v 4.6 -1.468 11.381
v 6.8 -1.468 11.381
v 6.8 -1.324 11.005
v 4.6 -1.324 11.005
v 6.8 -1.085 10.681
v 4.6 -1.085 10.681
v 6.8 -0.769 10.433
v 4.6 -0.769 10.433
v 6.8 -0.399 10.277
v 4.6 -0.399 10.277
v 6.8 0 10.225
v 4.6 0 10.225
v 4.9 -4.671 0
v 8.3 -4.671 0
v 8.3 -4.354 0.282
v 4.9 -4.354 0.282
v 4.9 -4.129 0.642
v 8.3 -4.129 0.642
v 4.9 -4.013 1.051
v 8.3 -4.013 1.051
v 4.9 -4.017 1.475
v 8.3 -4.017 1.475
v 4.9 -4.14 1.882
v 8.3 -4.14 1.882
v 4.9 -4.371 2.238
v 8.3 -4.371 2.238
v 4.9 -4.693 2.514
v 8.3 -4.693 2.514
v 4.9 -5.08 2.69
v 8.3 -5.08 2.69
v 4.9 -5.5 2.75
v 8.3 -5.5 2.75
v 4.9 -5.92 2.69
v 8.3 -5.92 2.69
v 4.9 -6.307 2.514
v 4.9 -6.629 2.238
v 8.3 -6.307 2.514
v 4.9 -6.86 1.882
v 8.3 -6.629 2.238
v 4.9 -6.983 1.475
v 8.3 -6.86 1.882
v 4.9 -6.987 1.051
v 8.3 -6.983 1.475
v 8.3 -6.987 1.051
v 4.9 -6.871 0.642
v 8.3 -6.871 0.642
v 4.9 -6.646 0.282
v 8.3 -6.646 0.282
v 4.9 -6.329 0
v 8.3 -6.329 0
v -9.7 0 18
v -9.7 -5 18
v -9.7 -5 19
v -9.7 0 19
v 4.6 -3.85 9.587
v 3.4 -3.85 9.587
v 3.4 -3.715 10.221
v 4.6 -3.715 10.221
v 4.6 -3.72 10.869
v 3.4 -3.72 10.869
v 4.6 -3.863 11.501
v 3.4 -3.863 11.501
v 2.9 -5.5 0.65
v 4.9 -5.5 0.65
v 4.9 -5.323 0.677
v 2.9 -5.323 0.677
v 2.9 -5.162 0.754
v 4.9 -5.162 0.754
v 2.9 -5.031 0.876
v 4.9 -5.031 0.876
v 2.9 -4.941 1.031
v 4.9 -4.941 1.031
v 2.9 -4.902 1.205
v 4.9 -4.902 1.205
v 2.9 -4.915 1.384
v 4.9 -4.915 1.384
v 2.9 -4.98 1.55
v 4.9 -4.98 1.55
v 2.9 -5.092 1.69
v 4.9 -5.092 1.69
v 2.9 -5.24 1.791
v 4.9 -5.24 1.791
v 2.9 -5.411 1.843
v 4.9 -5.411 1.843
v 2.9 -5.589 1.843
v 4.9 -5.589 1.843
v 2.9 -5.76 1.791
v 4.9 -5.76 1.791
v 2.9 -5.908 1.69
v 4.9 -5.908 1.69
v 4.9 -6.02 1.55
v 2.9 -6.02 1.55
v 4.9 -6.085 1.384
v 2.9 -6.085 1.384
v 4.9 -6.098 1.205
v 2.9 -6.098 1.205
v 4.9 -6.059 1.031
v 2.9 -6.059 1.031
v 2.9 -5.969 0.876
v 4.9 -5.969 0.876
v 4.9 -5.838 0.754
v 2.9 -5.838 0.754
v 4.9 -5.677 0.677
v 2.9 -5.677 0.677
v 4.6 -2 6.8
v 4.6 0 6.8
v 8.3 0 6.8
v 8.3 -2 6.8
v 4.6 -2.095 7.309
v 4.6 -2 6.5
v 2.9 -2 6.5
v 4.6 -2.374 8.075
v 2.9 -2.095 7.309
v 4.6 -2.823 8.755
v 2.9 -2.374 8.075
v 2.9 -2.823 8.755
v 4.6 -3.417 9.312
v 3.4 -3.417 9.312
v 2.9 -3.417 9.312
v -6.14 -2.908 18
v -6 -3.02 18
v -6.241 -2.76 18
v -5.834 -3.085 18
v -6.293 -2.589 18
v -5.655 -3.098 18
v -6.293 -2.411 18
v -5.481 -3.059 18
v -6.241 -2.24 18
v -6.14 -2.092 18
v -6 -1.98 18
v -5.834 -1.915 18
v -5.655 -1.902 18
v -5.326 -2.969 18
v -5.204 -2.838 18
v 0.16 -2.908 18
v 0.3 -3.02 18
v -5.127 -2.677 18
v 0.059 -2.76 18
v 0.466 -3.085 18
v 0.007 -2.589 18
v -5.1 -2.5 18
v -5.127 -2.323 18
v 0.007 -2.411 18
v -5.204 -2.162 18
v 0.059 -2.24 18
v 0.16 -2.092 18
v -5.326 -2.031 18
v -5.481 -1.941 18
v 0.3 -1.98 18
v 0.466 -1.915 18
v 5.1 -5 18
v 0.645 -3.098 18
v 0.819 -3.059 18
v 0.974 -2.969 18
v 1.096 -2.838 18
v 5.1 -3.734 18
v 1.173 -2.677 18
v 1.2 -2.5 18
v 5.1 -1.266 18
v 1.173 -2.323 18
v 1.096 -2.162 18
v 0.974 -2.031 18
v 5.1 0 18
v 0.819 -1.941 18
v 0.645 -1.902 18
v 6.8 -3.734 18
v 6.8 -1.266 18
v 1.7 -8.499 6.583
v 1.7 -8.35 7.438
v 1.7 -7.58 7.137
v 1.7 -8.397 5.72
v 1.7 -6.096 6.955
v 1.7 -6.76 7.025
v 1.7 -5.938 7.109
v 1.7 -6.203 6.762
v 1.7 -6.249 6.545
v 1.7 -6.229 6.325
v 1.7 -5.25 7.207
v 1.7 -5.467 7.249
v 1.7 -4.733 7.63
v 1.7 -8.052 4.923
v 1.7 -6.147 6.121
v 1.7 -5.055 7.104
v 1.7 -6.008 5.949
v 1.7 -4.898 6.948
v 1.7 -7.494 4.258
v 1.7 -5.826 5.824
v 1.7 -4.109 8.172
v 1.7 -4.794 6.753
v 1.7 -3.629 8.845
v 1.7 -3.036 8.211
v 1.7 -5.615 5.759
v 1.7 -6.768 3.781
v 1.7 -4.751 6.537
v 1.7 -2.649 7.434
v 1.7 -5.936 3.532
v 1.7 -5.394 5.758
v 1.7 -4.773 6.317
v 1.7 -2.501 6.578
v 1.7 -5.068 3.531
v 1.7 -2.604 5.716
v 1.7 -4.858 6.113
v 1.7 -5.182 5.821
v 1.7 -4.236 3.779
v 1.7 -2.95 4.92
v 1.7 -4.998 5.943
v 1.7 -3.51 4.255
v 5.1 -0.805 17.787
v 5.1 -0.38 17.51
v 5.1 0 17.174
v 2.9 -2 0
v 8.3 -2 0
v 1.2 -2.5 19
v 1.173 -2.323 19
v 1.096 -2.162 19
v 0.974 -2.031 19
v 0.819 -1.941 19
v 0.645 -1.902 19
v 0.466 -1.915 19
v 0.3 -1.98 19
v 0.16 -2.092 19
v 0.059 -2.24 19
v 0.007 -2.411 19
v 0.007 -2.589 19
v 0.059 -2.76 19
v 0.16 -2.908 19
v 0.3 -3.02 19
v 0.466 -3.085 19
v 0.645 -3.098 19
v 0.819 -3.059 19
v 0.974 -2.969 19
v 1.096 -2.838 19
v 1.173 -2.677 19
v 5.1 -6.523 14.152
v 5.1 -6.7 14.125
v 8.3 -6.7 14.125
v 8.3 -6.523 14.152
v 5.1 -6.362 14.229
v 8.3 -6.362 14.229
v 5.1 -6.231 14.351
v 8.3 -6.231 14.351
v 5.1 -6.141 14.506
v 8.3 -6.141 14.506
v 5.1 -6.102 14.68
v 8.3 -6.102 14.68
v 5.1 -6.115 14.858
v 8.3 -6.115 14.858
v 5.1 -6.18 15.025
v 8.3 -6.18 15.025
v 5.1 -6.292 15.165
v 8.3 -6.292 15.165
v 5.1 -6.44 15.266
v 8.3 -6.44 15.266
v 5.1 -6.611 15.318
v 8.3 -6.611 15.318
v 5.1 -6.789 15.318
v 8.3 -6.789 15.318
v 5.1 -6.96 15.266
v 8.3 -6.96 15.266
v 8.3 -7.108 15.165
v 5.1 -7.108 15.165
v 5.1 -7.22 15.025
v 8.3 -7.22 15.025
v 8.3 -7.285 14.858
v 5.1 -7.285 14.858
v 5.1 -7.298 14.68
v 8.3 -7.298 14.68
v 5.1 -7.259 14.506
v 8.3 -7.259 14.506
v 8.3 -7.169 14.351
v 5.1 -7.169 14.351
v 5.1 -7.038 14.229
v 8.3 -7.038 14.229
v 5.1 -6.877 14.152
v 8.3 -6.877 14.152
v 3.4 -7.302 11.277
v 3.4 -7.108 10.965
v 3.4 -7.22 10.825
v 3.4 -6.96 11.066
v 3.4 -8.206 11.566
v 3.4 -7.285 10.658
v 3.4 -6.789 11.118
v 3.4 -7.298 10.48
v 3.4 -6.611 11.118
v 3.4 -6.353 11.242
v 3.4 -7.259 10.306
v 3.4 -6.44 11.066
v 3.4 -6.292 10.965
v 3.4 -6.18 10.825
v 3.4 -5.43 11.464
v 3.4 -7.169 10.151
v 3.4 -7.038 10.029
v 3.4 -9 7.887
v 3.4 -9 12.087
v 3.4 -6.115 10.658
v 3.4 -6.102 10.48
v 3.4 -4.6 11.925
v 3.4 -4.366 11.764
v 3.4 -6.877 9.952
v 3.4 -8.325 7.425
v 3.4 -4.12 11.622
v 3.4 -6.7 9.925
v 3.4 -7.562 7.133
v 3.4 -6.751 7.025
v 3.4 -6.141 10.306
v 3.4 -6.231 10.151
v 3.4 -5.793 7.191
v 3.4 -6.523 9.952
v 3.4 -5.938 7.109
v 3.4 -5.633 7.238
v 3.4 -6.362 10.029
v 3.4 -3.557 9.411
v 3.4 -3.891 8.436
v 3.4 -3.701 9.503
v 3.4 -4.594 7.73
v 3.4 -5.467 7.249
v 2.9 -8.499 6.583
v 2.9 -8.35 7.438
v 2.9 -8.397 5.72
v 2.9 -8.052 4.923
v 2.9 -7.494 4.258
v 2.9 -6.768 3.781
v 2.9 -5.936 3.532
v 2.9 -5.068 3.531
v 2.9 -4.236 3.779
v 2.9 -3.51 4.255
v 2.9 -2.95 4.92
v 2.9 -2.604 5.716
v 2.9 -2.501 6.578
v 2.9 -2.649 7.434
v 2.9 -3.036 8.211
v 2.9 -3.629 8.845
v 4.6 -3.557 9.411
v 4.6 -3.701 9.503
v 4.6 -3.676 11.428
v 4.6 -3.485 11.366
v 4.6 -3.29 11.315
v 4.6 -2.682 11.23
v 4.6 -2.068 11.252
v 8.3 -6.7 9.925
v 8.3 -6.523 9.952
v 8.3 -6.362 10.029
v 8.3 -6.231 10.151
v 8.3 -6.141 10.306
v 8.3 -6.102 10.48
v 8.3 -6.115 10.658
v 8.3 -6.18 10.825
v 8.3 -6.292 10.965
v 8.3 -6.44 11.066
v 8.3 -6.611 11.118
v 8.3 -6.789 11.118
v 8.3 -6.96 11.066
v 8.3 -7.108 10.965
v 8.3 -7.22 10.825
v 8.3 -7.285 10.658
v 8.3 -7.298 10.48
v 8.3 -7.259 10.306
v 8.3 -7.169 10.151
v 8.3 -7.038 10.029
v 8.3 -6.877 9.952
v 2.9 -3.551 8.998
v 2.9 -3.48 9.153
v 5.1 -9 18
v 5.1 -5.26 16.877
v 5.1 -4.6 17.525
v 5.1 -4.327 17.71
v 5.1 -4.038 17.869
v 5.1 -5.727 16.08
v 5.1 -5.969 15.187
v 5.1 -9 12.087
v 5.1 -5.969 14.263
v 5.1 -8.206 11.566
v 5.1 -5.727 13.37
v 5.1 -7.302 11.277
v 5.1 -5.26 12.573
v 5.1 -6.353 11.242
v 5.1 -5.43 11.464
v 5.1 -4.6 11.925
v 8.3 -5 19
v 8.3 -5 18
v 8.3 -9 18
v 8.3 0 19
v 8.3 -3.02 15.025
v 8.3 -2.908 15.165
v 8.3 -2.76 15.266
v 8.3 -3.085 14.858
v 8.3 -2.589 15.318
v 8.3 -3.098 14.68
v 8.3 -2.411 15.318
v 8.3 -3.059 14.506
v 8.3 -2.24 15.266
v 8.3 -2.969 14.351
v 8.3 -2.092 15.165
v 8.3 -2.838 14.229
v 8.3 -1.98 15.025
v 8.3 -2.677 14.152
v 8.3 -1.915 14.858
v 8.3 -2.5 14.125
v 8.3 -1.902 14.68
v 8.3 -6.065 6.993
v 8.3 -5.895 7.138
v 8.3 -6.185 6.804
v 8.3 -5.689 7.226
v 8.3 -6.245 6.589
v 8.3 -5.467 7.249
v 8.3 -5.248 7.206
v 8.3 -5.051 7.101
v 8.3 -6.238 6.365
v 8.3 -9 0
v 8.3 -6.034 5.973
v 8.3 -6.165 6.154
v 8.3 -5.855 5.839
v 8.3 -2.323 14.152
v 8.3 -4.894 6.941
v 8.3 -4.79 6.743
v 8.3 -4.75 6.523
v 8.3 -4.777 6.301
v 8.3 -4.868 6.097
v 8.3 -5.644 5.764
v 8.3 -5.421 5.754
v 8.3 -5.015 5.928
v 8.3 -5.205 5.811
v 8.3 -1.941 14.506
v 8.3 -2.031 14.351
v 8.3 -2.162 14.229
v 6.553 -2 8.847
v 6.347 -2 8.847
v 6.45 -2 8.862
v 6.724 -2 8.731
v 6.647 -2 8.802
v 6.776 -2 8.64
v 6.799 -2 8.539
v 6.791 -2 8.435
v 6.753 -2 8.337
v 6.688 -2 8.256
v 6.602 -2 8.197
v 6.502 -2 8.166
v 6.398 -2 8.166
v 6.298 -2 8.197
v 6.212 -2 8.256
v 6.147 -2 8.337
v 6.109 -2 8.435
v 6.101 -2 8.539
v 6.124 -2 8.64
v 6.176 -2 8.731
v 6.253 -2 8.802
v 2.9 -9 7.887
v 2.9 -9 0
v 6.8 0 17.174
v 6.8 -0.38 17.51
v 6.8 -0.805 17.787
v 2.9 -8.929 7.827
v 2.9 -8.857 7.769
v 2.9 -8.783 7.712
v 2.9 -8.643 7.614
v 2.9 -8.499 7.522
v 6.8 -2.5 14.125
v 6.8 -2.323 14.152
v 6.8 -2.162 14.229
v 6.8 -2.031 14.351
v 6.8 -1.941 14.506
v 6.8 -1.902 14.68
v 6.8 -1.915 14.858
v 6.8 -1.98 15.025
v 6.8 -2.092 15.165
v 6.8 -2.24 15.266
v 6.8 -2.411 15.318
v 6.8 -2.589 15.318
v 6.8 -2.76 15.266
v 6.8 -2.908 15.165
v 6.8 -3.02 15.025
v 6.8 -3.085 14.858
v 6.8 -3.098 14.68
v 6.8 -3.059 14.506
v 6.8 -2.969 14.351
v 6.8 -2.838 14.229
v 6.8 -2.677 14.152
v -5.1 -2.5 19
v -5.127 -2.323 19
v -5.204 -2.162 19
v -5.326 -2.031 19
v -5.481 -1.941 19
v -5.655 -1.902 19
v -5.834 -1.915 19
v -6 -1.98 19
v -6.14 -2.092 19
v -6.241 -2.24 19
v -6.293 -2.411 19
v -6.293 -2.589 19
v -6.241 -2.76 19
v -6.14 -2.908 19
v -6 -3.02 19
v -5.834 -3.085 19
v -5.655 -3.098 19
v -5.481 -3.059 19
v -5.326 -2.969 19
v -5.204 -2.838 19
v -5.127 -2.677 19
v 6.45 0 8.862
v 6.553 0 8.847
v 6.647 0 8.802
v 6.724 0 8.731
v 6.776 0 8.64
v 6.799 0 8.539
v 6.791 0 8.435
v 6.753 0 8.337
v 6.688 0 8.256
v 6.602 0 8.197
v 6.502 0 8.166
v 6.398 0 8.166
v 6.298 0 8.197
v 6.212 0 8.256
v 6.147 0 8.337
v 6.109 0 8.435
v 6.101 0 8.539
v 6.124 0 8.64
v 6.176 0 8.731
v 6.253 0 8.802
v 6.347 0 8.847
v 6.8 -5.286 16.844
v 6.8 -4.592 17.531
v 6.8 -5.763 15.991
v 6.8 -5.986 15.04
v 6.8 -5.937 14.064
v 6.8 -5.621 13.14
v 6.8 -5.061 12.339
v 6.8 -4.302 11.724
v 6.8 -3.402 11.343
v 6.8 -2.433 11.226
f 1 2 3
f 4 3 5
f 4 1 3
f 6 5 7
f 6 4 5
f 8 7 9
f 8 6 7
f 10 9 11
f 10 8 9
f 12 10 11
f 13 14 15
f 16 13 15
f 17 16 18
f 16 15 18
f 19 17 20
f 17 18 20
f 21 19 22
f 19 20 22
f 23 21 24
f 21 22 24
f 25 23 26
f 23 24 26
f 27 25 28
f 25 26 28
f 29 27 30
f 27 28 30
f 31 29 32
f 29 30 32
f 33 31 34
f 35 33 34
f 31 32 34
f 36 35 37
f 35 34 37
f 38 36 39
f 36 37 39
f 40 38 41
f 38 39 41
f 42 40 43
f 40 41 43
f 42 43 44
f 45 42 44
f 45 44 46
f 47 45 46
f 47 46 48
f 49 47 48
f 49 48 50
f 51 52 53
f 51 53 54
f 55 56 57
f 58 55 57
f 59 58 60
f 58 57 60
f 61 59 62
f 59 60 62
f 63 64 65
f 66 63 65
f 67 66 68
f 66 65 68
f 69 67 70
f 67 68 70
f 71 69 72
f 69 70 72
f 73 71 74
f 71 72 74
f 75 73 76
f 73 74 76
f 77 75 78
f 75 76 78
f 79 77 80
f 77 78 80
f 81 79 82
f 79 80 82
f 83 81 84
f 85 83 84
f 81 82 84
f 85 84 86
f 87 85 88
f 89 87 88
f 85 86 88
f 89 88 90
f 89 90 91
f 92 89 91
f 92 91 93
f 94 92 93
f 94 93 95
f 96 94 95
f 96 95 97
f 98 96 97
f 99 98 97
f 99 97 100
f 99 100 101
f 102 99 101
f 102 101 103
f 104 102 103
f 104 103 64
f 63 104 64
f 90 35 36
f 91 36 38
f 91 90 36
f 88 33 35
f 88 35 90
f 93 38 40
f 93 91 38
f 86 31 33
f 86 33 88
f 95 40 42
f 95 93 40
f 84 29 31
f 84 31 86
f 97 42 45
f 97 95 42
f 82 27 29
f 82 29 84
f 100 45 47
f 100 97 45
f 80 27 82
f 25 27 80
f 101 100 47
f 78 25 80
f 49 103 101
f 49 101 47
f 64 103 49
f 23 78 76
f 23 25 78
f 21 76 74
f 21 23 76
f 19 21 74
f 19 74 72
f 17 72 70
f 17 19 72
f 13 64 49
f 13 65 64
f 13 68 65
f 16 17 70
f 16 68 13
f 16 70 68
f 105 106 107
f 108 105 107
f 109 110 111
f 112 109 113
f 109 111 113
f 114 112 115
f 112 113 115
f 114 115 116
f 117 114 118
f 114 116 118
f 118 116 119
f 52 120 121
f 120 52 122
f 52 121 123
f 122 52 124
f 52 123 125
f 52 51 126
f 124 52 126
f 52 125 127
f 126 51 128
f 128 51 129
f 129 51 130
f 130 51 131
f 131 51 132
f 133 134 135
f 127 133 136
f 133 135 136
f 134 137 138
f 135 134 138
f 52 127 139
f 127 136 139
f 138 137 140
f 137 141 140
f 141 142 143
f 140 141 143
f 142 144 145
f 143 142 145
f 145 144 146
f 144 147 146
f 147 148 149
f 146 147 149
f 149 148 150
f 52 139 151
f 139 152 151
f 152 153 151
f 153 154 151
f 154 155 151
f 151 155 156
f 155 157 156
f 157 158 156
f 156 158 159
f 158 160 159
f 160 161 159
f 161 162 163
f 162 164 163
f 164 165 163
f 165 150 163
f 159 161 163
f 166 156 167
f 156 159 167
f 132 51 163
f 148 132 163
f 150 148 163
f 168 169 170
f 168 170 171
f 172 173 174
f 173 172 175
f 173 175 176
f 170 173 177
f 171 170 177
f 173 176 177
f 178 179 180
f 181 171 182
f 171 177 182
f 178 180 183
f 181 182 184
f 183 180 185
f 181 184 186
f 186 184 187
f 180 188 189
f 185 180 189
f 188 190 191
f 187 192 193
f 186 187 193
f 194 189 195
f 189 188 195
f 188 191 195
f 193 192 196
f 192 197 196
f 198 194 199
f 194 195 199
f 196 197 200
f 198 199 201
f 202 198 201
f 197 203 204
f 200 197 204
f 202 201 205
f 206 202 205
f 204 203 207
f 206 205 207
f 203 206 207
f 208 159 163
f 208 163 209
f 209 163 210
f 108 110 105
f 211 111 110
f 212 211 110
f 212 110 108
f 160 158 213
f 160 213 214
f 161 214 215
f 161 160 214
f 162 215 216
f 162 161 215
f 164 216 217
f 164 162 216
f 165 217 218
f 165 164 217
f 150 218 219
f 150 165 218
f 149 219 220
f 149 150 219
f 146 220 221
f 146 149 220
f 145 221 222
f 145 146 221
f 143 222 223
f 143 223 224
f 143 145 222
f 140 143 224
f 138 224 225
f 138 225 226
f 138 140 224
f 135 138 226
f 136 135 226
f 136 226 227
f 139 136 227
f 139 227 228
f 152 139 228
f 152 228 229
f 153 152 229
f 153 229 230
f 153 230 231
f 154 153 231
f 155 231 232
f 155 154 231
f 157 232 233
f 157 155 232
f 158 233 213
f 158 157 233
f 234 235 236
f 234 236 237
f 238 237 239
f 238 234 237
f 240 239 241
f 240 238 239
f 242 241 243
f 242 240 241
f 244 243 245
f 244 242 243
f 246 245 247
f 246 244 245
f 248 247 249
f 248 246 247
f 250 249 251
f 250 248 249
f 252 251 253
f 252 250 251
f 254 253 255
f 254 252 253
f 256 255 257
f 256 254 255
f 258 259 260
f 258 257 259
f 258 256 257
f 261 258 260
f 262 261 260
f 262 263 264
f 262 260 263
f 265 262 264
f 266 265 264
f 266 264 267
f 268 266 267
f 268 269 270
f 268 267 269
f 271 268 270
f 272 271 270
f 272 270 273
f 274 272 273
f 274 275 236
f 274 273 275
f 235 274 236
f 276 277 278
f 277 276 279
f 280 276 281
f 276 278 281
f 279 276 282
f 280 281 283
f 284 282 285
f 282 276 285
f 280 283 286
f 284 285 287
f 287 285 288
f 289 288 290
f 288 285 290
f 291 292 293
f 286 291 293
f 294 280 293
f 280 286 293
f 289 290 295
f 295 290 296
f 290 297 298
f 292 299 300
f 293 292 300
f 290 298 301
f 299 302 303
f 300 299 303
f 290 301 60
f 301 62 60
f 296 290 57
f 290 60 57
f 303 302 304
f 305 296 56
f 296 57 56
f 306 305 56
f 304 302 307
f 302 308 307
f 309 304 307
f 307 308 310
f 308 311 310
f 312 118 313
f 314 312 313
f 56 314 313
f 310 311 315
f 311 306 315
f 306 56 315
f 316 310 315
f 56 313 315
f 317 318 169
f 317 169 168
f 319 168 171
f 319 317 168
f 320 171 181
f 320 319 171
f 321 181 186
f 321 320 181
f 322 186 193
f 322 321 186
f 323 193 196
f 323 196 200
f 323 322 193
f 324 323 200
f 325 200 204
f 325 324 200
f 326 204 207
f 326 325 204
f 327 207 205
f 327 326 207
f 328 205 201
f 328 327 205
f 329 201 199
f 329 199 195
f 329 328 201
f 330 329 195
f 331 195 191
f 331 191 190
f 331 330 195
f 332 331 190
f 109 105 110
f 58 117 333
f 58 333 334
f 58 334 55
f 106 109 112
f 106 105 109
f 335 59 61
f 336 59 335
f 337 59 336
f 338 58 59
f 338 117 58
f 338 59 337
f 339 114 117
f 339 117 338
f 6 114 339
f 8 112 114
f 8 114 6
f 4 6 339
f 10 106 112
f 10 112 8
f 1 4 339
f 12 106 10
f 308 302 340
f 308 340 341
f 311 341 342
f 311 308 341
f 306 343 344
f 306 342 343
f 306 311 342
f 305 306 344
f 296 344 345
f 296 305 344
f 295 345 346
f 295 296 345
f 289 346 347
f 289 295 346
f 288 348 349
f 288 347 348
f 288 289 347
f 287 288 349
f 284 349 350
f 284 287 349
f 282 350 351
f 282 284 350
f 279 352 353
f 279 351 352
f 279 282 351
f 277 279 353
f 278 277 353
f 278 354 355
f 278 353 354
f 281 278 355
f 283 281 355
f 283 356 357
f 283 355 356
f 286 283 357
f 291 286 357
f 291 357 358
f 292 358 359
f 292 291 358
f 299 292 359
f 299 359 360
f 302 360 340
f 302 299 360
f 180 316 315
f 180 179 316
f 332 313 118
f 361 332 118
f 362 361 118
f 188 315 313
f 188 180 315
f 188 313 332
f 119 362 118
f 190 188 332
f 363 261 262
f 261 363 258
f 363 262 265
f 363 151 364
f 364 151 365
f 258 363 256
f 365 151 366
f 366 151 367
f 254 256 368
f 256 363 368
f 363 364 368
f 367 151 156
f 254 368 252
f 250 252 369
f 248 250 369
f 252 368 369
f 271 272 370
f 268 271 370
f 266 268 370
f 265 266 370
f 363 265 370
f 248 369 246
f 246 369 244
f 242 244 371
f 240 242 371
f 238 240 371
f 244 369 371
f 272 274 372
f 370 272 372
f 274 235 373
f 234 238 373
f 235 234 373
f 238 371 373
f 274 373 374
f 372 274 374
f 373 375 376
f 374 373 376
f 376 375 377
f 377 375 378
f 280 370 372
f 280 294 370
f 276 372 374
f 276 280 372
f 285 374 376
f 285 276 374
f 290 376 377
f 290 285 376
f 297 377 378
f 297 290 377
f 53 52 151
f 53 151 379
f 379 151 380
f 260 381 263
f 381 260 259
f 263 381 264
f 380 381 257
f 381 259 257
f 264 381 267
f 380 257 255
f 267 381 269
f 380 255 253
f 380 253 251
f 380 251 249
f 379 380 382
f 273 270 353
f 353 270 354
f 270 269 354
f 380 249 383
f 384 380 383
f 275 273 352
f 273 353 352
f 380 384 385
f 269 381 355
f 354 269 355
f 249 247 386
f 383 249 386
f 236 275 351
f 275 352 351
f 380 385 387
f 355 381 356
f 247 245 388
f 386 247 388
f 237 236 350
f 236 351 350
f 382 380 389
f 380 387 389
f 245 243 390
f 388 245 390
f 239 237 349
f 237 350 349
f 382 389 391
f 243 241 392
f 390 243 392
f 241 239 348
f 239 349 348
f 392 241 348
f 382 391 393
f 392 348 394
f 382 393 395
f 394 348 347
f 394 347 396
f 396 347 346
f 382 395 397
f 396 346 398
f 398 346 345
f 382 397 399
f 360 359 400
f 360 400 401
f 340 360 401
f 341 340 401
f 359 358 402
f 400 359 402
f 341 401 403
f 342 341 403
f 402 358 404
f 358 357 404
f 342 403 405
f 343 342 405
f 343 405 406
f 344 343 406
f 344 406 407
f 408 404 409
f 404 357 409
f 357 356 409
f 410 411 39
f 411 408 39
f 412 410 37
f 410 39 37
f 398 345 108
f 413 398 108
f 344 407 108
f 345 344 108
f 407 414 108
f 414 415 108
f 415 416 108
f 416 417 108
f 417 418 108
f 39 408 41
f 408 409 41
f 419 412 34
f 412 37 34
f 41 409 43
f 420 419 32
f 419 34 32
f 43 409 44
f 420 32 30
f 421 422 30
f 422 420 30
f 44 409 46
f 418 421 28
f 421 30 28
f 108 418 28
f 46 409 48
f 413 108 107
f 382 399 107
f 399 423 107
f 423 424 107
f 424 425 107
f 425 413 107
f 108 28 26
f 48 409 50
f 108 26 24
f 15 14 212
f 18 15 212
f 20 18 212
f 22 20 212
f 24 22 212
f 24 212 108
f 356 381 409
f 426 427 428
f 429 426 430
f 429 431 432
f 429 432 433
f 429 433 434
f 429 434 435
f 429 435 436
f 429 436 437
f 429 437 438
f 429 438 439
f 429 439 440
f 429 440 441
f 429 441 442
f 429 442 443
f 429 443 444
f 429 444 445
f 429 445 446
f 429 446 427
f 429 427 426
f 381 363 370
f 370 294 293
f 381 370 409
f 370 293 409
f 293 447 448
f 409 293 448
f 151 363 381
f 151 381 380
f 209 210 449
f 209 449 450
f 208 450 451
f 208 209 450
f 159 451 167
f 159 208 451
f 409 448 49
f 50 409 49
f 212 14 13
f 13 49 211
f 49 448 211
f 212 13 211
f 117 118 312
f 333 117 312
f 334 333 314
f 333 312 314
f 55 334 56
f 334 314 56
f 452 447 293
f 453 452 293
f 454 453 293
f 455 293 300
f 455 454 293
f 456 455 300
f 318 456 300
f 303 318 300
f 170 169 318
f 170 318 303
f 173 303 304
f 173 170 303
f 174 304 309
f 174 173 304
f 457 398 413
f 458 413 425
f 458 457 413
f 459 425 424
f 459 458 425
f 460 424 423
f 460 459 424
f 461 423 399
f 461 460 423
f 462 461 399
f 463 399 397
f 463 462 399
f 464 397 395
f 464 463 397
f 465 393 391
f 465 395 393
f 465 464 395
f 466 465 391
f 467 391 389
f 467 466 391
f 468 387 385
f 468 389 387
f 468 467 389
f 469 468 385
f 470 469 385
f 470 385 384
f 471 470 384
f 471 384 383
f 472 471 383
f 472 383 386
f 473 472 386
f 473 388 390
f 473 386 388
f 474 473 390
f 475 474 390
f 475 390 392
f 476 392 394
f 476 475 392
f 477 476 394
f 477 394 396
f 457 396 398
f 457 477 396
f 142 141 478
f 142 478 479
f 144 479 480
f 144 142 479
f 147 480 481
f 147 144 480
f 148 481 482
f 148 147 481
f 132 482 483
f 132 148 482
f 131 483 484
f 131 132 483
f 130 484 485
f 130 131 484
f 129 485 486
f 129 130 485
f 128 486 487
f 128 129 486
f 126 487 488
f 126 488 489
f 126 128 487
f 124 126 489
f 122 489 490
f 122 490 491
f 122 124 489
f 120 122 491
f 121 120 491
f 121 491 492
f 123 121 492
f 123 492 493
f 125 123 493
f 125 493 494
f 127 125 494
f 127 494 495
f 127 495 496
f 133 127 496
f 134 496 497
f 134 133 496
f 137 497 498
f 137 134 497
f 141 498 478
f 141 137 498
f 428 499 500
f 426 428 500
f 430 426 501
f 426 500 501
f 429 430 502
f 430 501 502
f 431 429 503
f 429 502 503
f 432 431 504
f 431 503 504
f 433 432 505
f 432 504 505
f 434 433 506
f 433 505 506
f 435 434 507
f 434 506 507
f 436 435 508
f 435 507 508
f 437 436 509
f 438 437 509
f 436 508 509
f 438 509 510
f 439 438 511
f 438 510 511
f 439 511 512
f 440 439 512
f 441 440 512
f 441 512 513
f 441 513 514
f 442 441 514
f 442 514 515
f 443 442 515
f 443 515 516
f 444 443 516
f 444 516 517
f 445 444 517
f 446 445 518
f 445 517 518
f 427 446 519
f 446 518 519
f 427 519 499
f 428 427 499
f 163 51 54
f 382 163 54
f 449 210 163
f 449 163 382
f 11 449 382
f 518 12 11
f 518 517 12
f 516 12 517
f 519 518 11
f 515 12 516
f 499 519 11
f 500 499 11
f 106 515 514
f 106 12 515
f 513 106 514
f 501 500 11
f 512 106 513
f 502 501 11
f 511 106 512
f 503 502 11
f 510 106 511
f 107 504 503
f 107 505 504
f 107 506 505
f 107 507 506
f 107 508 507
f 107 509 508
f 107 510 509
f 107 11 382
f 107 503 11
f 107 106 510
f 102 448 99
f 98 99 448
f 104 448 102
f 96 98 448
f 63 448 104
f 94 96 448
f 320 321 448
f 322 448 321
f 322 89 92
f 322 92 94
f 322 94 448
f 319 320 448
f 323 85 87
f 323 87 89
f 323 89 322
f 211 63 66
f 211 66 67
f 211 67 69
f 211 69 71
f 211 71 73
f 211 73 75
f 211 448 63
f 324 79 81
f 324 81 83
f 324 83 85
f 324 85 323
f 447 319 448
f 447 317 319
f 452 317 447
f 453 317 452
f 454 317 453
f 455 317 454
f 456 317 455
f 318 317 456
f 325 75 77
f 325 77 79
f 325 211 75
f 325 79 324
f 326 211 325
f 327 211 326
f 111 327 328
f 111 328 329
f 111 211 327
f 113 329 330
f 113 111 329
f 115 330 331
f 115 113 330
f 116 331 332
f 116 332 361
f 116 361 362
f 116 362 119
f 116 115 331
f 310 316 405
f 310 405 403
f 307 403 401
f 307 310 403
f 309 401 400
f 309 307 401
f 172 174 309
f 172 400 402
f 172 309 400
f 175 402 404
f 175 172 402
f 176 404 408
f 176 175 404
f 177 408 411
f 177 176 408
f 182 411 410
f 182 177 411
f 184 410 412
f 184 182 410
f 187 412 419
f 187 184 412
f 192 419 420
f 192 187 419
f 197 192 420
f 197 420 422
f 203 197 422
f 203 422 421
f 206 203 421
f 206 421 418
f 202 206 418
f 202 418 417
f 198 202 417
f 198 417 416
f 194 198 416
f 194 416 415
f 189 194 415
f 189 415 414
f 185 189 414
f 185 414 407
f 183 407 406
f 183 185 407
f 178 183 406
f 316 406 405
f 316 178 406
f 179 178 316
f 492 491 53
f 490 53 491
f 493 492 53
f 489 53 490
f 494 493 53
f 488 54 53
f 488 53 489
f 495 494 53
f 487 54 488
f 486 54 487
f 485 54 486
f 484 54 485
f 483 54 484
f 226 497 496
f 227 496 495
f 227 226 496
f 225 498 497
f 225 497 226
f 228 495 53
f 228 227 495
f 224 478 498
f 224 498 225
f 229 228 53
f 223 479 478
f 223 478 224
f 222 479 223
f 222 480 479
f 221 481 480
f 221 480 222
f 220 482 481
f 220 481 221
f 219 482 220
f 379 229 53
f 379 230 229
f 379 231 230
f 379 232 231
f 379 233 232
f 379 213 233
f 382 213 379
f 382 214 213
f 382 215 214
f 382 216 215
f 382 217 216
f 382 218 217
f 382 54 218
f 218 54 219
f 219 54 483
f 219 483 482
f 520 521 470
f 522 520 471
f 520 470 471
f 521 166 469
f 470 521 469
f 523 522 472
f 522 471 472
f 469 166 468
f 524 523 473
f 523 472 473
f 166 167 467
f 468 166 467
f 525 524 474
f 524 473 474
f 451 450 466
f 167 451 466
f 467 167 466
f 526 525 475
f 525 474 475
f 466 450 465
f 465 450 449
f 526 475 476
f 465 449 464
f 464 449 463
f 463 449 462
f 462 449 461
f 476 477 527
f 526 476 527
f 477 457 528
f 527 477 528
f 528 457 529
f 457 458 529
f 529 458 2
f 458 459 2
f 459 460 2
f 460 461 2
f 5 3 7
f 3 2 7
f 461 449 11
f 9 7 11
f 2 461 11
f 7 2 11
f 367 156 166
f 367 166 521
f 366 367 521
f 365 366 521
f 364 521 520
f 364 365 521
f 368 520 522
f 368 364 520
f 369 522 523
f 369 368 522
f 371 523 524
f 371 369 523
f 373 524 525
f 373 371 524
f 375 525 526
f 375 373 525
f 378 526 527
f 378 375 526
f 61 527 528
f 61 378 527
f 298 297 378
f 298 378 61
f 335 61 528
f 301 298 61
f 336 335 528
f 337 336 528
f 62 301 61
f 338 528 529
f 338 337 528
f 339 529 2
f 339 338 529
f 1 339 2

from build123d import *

# Parameters (mm, degrees)
SKETCH_1_W           = 18
SKETCH_1_H           = 9
EXTRUDE_1_DEPTH      = 8.3
SKETCH_1_12_R        = 3.5
CUT_EXTRUDE_1_DEPTH  = 6.8
SKETCH_1_14_R        = 3.5
CUT_EXTRUDE_2_DEPTH  = 5.1
SKETCH_1_15_R        = 3.5
CUT_EXTRUDE_3_DEPTH  = 3.4
SKETCH_1_16_R        = 4
CUT_EXTRUDE_4_DEPTH  = 1.7
CUT_EXTRUDE_5_DEPTH  = 5.1
CUT_EXTRUDE_6_DEPTH  = 2.9
CUT_EXTRUDE_7_DEPTH  = 1.2
SKETCH_3_W           = 5.4
SKETCH_3_H           = 6.8
CUT_EXTRUDE_8_DEPTH  = 2
SKETCH_1_19_R        = 1.5
CUT_EXTRUDE_9_DEPTH  = 6.8
CUT_EXTRUDE_10_DEPTH = 1.7
CUT_EXTRUDE_11_DEPTH = 1.2
CUT_EXTRUDE_START    = 0.5
CUT_EXTRUDE_13_DEPTH = 1.2
CUT_EXTRUDE_START_2  = 6.8
SKETCH_1_20_R        = 0.6
CUT_EXTRUDE_14_DEPTH = 15.969014677
CUT_EXTRUDE_START_3  = 1.7
SKETCH_1_21_R        = 0.75
SKETCH_1_21_R_2      = 0.6
CUT_EXTRUDE_15_DEPTH = 21.069014677
SKETCH_6_R           = 0.6
CUT_EXTRUDE_16_DEPTH = 22.179235114
SKETCH_6_3_R         = 1.5
CUT_EXTRUDE_17_DEPTH = 3.4
SKETCH_7_W           = 18
SKETCH_7_H           = 5
SKETCH_7_R           = 0.6
EXTRUDE_2_DEPTH      = 1
SKETCH_8_R           = 0.35
CUT_EXTRUDE_18_DEPTH = 2


with BuildPart() as part:
    # 草图1 → 凸台-拉伸1 (new body)
    with BuildSketch(Plane(origin=(0, 0, 0), x_dir=(0, 0, -1), z_dir=(1, 0, 0))):
        with Locations((-9, -4.5)):
            Rectangle(SKETCH_1_W, SKETCH_1_H)
    extrude(amount=EXTRUDE_1_DEPTH)

    # 草图1<12> → 切除-拉伸1 (cut)
    with BuildSketch(Plane(origin=(0, 0, 0), x_dir=(0, 0, -1), z_dir=(1, 0, 0))):
        with Locations((-14.724922359, -2.5)):
            Circle(SKETCH_1_12_R)
    extrude(amount=CUT_EXTRUDE_1_DEPTH, mode=Mode.SUBTRACT)

    # 草图1<14> → 切除-拉伸2 (cut)
    with BuildSketch(Plane(origin=(0, 0, 0), x_dir=(0, 0, -1), z_dir=(1, 0, 0))):
        with Locations((-14.724922359, -6.7)):
            Circle(SKETCH_1_14_R)
    extrude(amount=CUT_EXTRUDE_2_DEPTH, mode=Mode.SUBTRACT)

    # 草图1<15> → 切除-拉伸3 (cut)
    with BuildSketch(Plane(origin=(0, 0, 0), x_dir=(0, 0, -1), z_dir=(1, 0, 0))):
        with Locations((-10.524922359, -6.7)):
            Circle(SKETCH_1_15_R)
    extrude(amount=CUT_EXTRUDE_3_DEPTH, mode=Mode.SUBTRACT)

    # 草图1<16> → 切除-拉伸4 (cut)
    with BuildSketch(Plane(origin=(0, 0, 0), x_dir=(0, 0, -1), z_dir=(1, 0, 0))):
        with Locations((-6.5, -5.5)):
            Circle(SKETCH_1_16_R)
    extrude(amount=CUT_EXTRUDE_4_DEPTH, mode=Mode.SUBTRACT)

    # 草图1<17> → 切除-拉伸5 (cut)
    with BuildSketch(Plane(origin=(0, 0, 0), x_dir=(0, 0, -1), z_dir=(1, 0, 0))):
        with BuildLine():
            Line((-18, -9), (-17.363103551, -9))
            ThreePointArc((-17.363103551, -9), (-17.729170482, -8.495687395), (-18, -7.934449857))
            Line((-18, -7.934449857), (-18, -9))
        make_face()
        with BuildLine():
            ThreePointArc((-17.524922359, -4.6), (-17.793136229, -4.184061654), (-18, -3.734449857))
            Line((-18, -3.734449857), (-18, -5.465550143))
            ThreePointArc((-18, -5.465550143), (-17.793136229, -5.015938346), (-17.524922359, -4.6))
        make_face()
        with BuildLine():
            ThreePointArc((-18, -1.265550143), (-17.656316605, -0.58769046), (-17.174412102, 0))
            Line((-17.174412102, 0), (-18, 0))
            Line((-18, 0), (-18, -1.265550143))
        make_face()
    extrude(amount=CUT_EXTRUDE_5_DEPTH, mode=Mode.SUBTRACT)

    # 草图1<18> → 切除-拉伸6 (cut)
    with BuildSketch(Plane(origin=(0, 0, 0), x_dir=(0, 0, -1), z_dir=(1, 0, 0))):
        with BuildLine():
            Line((0, -9), (0, 0))
            Line((0, 0), (-8.624932715, 0))
            ThreePointArc((-8.624932715, 0), (-8.624924948, -0.004006417), (-8.624922359, -0.008012841))
            ThreePointArc((-8.624922359, -0.008012841), (-9.378363691, -2.033762682), (-11.272446499, -3.074813388))
            ThreePointArc((-11.272446499, -3.074813388), (-11.292201209, -3.182953516), (-11.315342274, -3.290419915))
            ThreePointArc((-11.315342274, -3.290419915), (-10.569517592, -3.200284116), (-9.821638329, -3.271386348))
            ThreePointArc((-9.821638329, -3.271386348), (-5.335215324, -1.673346546), (-2.5, -5.5))
            ThreePointArc((-2.5, -5.5), (-3.054280431, -7.531506006), (-4.563508327, -9))
            Line((-4.563508327, -9), (0, -9))
        make_face()
        with BuildLine():
            ThreePointArc((-8.624922359, -0.008012841), (-8.624924948, -0.004006417), (-8.624932715, 0))
            Line((-8.624932715, 0), (-10.224943762, 0))
            ThreePointArc((-10.224943762, 0), (-10.22492771, -0.004006406), (-10.224922359, -0.008012841))
            ThreePointArc((-10.224922359, -0.008012841), (-10.548791645, -0.938988964), (-11.380544415, -1.467945659))
            ThreePointArc((-11.380544415, -1.467945659), (-11.264046545, -1.978139294), (-11.224922359, -2.5))
            ThreePointArc((-11.224922359, -2.5), (-11.236823629, -2.788387316), (-11.272446499, -3.074813388))
            ThreePointArc((-11.272446499, -3.074813388), (-9.378363691, -2.033762682), (-8.624922359, -0.008012841))
        make_face()
        with BuildLine():
            Line((-10.224943762, 0), (-8.624932715, 0))
            ThreePointArc((-8.624932715, 0), (-11.218224886, 3.050296769), (-14.656688161, 0.999334807))
            ThreePointArc((-14.656688161, 0.999334807), (-13.853421855, 0.889762067), (-13.096913716, 0.598320167))
            ThreePointArc((-13.096913716, 0.598320167), (-11.418994363, 1.460458494), (-10.224943762, 0))
        make_face()
        with BuildLine():
            ThreePointArc((-13.096913716, 0.598320167), (-13.853421855, 0.889762067), (-14.656688161, 0.999334807))
            ThreePointArc((-14.656688161, 0.999334807), (-14.781912048, 0.50658802), (-14.824912004, 0))
            Line((-14.824912004, 0), (-13.224900957, 0))
            ThreePointArc((-13.224900957, 0), (-13.191738507, 0.305755209), (-13.096913716, 0.598320167))
        make_face()
        with BuildLine():
            ThreePointArc((-10.224922359, -0.008012841), (-10.22492771, -0.004006406), (-10.224943762, 0))
            Line((-10.224943762, 0), (-12.275432617, 0))
            ThreePointArc((-12.275432617, 0), (-11.736454222, -0.678171745), (-11.380544415, -1.467945659))
            ThreePointArc((-11.380544415, -1.467945659), (-10.548791645, -0.938988964), (-10.224922359, -0.008012841))
        make_face()
        with BuildLine():
            Line((-12.275432617, 0), (-10.224943762, 0))
            ThreePointArc((-10.224943762, 0), (-11.418994363, 1.460458494), (-13.096913716, 0.598320167))
            ThreePointArc((-13.096913716, 0.598320167), (-12.664341124, 0.329135022), (-12.275432617, 0))
        make_face()
        with BuildLine():
            ThreePointArc((-11.380544415, -1.467945659), (-11.736454222, -0.678171745), (-12.275432617, 0))
            Line((-12.275432617, 0), (-13.224900957, 0))
            ThreePointArc((-13.224900957, 0), (-12.659036556, -1.181652764), (-11.380544415, -1.467945659))
        make_face()
        with BuildLine():
            Line((-13.224900957, 0), (-12.275432617, 0))
            ThreePointArc((-12.275432617, 0), (-12.664341124, 0.329135022), (-13.096913716, 0.598320167))
            ThreePointArc((-13.096913716, 0.598320167), (-13.191738507, 0.305755209), (-13.224900957, 0))
        make_face()
    extrude(amount=CUT_EXTRUDE_6_DEPTH, mode=Mode.SUBTRACT)

    # 草图2 → 切除-拉伸7 (cut)
    with BuildSketch(Plane.ZY.offset(-1.7)):
        with BuildLine():
            ThreePointArc((6.5, -9), (3.374181267, -3.925434267), (9.31246118, -3.416718427))
            ThreePointArc((9.31246118, -3.416718427), (9.564297417, -3.334409455), (9.821638329, -3.271386348))
            ThreePointArc((9.821638329, -3.271386348), (3.553152293, -2.795173094), (4.563508327, -9))
            Line((4.563508327, -9), (6.5, -9))
        make_face()
    extrude(amount=-CUT_EXTRUDE_7_DEPTH, mode=Mode.SUBTRACT)

    # 草图3 → 切除-拉伸8 (cut)
    with BuildSketch(Plane(origin=(0, 0, 0), x_dir=(1, 0, 0), z_dir=(0, 1, 0))):
        with Locations((5.6, -3.4)):
            Rectangle(SKETCH_3_W, SKETCH_3_H)
    extrude(amount=-CUT_EXTRUDE_8_DEPTH, mode=Mode.SUBTRACT)

    # 草图1<19> → 切除-拉伸9 (cut)
    with BuildSketch(Plane(origin=(0, 0, 0), x_dir=(0, 0, -1), z_dir=(1, 0, 0))):
        with Locations((-11.724922359, -0.008012841)):
            Circle(SKETCH_1_19_R)
    extrude(amount=CUT_EXTRUDE_9_DEPTH, mode=Mode.SUBTRACT)

    # 草图4 → 切除-拉伸10 (cut)
    with BuildSketch(Plane.ZY.offset(-2.9)):
        with BuildLine():
            Line((10.224943762, 0), (6.8, 0))
            Line((6.8, 0), (6.8, -2))
            Line((6.8, -2), (6.5, -2))
            ThreePointArc((6.5, -2), (8.074565733, -2.374181267), (9.31246118, -3.416718427))
            ThreePointArc((9.31246118, -3.416718427), (10.304655394, -3.206937953), (11.315342274, -3.290419915))
            ThreePointArc((11.315342274, -3.290419915), (11.227160165, -2.374861561), (11.380544415, -1.467945659))
            ThreePointArc((11.380544415, -1.467945659), (10.546309243, -0.935844249), (10.224943762, 0))
        make_face()
    extrude(amount=-CUT_EXTRUDE_10_DEPTH, mode=Mode.SUBTRACT)

    # 草图5 → 切除-拉伸11 (cut)
    with BuildSketch(Plane.ZY.offset(-3.4)):
        with BuildLine():
            ThreePointArc((11.315342274, -3.290419915), (10.304655394, -3.206937953), (9.31246118, -3.416718427))
            ThreePointArc((9.31246118, -3.416718427), (9.45763616, -3.628533104), (9.58689031, -3.850421808))
            ThreePointArc((9.58689031, -3.850421808), (10.545192403, -3.70006848), (11.501375265, -3.863357667))
            ThreePointArc((11.501375265, -3.863357667), (11.396009855, -3.580898486), (11.315342274, -3.290419915))
        make_face()
    extrude(amount=-CUT_EXTRUDE_11_DEPTH, mode=Mode.SUBTRACT)

    # 草图5<4> → 切除-拉伸13 (cut)
    with BuildSketch(Plane.ZY.offset(-3.4).offset(CUT_EXTRUDE_START)):
        with BuildLine():
            ThreePointArc((9.31246118, -3.416718427), (3.374181267, -3.925434267), (6.5, -9))
            ThreePointArc((6.5, -9), (7.115838654, -8.945394426), (7.71246118, -8.783281573))
            ThreePointArc((7.71246118, -8.783281573), (7.567286199, -8.571466896), (7.438032049, -8.349578192))
            ThreePointArc((7.438032049, -8.349578192), (3.625055458, -4.642857143), (8.845337154, -3.629333372))
            ThreePointArc((8.845337154, -3.629333372), (9.074996723, -3.514452065), (9.31246118, -3.416718427))
        make_face()
        with BuildLine():
            ThreePointArc((7.71246118, -8.783281573), (7.115838654, -8.945394426), (6.5, -9))
            Line((6.5, -9), (7.886741168, -9))
            ThreePointArc((7.886741168, -9), (7.797447835, -8.893372453), (7.71246118, -8.783281573))
        make_face()
    extrude(amount=CUT_EXTRUDE_13_DEPTH, mode=Mode.SUBTRACT)

    # 草图1<20> → 切除-拉伸14 (cut, through all)
    with BuildSketch(Plane(origin=(0, 0, 0), x_dir=(0, 0, -1), z_dir=(1, 0, 0)).offset(CUT_EXTRUDE_START_2)):
        with Locations((-14.724922359, -2.5)):
            Circle(SKETCH_1_20_R)
    extrude(amount=CUT_EXTRUDE_14_DEPTH, mode=Mode.SUBTRACT)

    # 草图1<21> → 切除-拉伸15 (cut, through all)
    with BuildSketch(Plane(origin=(0, 0, 0), x_dir=(0, 0, -1), z_dir=(1, 0, 0)).offset(CUT_EXTRUDE_START_3)):
        with Locations(Location((-6.5, -5.5, 0), (0, 0, 177.482710398))):
            Circle(SKETCH_1_21_R)
        with Locations((-14.724922359, -6.7)):
            Circle(SKETCH_1_21_R_2)
        with Locations((-10.524922359, -6.7)):
            Circle(SKETCH_1_21_R_2)
    extrude(amount=CUT_EXTRUDE_15_DEPTH, mode=Mode.SUBTRACT)

    # 草图6 → 切除-拉伸16 (cut, through all)
    with BuildSketch(Plane(origin=(8.3, 0, 0), x_dir=(0, 0, -1), z_dir=(1, 0, 0))):
        with Locations((-1.25, -5.5)):
            Circle(SKETCH_6_R)
    extrude(amount=-CUT_EXTRUDE_16_DEPTH, mode=Mode.SUBTRACT)

    # 草图6<3> → 切除-拉伸17 (cut)
    with BuildSketch(Plane(origin=(8.3, 0, 0), x_dir=(0, 0, -1), z_dir=(1, 0, 0))):
        with Locations((-1.25, -5.5)):
            Circle(SKETCH_6_3_R)
    extrude(amount=-CUT_EXTRUDE_17_DEPTH, mode=Mode.SUBTRACT)

    # 草图7 → 凸台-拉伸2 (add)
    with BuildSketch(Plane.XY.offset(18)):
        with Locations((-0.7, -2.5)):
            Rectangle(SKETCH_7_W, SKETCH_7_H)
        with Locations((-5.7, -2.5)):
            Circle(SKETCH_7_R, mode=Mode.SUBTRACT)
        with Locations((0.6, -2.5)):
            Circle(SKETCH_7_R, mode=Mode.SUBTRACT)
    extrude(amount=EXTRUDE_2_DEPTH)

    # 草图8 → 切除-拉伸18 (cut)
    with BuildSketch(Plane(origin=(0, 0, 0), x_dir=(1, 0, 0), z_dir=(0, 1, 0))):
        with Locations(Location((6.45, -8.512471881, 0), (0, 0, 270))):
            Circle(SKETCH_8_R)
    extrude(amount=-CUT_EXTRUDE_18_DEPTH, mode=Mode.SUBTRACT)


solid = part.part
